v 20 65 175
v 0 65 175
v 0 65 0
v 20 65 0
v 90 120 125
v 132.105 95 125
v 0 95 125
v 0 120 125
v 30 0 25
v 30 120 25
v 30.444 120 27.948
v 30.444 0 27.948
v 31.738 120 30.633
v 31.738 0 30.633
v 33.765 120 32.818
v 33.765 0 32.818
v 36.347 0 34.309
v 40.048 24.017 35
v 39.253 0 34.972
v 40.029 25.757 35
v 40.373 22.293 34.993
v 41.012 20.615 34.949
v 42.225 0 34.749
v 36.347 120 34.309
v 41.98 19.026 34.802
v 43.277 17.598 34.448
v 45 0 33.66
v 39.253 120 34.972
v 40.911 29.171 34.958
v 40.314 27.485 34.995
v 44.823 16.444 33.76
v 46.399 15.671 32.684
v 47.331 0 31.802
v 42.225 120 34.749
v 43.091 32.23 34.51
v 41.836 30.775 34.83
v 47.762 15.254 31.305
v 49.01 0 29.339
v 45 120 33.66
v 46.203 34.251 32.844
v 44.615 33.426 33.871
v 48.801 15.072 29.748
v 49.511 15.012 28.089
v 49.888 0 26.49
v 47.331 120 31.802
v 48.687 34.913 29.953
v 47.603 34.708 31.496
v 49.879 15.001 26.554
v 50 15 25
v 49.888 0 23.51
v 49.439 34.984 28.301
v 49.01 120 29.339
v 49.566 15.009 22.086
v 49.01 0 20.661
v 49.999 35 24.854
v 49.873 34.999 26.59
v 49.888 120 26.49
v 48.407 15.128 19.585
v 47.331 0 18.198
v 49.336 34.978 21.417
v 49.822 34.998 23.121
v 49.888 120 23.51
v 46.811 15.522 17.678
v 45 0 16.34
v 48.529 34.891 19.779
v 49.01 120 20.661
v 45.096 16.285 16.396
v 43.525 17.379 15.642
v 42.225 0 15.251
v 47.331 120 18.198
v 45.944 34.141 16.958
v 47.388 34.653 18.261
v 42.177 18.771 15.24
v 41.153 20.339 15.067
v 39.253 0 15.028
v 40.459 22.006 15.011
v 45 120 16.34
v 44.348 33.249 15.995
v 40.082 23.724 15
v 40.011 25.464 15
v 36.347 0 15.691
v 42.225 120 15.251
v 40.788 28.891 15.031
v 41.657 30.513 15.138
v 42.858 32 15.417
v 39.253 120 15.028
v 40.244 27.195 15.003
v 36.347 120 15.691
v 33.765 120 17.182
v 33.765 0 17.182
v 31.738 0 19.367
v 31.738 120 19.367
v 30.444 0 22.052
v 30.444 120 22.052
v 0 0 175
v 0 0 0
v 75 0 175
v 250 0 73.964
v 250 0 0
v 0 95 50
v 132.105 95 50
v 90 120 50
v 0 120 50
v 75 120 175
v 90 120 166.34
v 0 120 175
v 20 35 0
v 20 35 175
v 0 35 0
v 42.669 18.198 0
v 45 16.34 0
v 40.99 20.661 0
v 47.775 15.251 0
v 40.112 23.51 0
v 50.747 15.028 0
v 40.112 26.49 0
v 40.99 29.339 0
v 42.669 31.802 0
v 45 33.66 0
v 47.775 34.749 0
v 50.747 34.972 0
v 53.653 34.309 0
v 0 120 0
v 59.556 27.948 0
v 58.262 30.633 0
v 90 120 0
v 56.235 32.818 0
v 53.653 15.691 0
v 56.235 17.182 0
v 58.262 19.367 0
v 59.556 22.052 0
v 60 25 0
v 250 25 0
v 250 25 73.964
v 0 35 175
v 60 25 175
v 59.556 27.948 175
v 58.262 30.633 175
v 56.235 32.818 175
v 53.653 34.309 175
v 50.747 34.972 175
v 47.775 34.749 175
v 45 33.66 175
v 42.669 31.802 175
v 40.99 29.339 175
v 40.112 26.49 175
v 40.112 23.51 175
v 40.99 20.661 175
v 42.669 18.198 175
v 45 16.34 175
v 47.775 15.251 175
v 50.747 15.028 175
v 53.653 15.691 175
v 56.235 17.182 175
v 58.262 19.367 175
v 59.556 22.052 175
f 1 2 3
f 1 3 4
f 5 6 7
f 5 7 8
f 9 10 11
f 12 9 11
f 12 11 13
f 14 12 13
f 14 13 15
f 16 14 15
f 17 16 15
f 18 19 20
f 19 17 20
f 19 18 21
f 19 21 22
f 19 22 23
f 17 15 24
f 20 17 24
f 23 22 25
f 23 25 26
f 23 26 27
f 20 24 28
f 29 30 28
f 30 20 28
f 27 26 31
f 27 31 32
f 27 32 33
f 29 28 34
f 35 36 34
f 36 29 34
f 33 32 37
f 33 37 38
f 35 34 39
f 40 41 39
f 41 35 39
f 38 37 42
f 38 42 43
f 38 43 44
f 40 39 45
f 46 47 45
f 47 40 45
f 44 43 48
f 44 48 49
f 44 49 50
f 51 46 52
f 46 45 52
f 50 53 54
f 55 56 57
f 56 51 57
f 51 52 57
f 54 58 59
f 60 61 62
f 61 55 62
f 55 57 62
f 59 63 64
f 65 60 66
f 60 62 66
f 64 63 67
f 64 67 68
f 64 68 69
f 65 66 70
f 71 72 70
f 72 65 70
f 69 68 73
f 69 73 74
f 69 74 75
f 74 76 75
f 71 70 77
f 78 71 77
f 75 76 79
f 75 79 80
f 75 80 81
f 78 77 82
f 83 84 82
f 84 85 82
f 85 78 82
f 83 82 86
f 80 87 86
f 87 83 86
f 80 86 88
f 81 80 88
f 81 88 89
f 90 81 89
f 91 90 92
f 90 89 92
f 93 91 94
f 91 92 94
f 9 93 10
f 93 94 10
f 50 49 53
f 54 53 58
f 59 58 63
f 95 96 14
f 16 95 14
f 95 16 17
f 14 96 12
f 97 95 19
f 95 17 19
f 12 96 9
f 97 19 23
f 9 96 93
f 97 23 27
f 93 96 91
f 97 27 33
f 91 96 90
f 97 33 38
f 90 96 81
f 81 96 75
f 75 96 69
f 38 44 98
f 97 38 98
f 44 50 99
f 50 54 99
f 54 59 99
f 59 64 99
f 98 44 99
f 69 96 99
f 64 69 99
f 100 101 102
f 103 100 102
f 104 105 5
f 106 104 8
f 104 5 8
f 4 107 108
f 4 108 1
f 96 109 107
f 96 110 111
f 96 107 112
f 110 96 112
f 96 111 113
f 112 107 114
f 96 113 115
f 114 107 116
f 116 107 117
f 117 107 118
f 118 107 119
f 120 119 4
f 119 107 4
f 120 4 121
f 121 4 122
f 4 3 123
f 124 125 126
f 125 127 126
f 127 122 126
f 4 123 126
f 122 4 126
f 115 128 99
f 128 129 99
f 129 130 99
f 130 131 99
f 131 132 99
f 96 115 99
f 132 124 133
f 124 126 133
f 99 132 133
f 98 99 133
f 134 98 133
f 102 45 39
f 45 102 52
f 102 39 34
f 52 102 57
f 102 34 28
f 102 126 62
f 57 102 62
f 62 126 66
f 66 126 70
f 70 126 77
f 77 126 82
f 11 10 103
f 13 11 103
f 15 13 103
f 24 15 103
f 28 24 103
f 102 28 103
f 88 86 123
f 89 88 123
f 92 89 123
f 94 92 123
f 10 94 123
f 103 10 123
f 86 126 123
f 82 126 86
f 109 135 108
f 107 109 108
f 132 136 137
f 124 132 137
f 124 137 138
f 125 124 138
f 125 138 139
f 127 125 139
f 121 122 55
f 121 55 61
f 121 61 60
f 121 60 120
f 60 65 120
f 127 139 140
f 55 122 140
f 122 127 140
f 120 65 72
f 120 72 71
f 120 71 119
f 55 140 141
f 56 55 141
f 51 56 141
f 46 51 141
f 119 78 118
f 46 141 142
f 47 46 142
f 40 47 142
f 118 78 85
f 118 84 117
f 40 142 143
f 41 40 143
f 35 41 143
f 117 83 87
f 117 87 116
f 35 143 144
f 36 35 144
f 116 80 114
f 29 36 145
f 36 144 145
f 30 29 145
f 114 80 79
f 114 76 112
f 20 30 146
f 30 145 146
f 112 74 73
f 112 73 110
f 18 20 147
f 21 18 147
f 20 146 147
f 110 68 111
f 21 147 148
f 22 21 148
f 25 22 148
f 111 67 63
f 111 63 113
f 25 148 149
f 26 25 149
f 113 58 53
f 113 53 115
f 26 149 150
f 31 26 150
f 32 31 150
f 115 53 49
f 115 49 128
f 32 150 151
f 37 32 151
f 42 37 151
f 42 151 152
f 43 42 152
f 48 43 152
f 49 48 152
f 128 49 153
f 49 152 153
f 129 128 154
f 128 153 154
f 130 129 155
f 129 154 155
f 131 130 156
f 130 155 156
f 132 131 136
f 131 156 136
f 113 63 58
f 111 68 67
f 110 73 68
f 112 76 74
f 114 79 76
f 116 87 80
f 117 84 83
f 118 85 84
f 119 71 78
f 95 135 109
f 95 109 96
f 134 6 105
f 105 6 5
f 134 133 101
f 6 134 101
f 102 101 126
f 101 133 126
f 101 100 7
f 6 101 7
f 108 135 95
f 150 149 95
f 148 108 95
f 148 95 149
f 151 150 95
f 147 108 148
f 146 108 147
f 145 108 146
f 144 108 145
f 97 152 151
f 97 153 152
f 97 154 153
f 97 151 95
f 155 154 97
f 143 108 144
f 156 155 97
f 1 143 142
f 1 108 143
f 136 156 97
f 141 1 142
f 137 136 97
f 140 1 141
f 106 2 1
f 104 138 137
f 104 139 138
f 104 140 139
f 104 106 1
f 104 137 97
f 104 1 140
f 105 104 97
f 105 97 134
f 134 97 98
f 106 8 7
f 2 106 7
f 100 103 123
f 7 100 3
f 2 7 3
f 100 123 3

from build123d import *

# Parameters (mm, degrees)
EXTRUDE_3_DEPTH     = 175
CUT_EXTRUDE_2_DEPTH = 220
SKETCH_9_W          = 75
SKETCH_9_H          = 25
CUT_EXTRUDE_3_DEPTH = 220
SKETCH_10_W         = 20
SKETCH_10_H         = 30
CUT_EXTRUDE_4_DEPTH = 220
SKETCH_11_R         = 10
CUT_EXTRUDE_5_DEPTH = 220
SKETCH_12_R         = 10
CUT_EXTRUDE_6_DEPTH = 220


with BuildPart() as part:
    # 草图7 → 凸台-拉伸3 (new body)
    with BuildSketch(Plane.XY):
        Polygon((0, 0), (250, 0), (250, 25), (90, 120), (0, 120), align=None)
    extrude(amount=EXTRUDE_3_DEPTH)

    # 草图8 → 切除-拉伸2 (cut)
    with BuildSketch(Plane(origin=(0, 0, 0), x_dir=(1, 0, 0), z_dir=(0, 1, 0))):
        Polygon((75, -175), (250, -73.963702892), (250, -175), align=None)
    extrude(amount=CUT_EXTRUDE_2_DEPTH, mode=Mode.SUBTRACT)

    # 草图9 → 切除-拉伸3 (cut)
    with BuildSketch(Plane.ZY):
        with Locations((87.5, 107.5)):
            Rectangle(SKETCH_9_W, SKETCH_9_H)
    extrude(amount=-CUT_EXTRUDE_3_DEPTH, mode=Mode.SUBTRACT)

    # 草图10 → 切除-拉伸4 (cut)
    with BuildSketch(Plane.XY.offset(175)):
        with Locations((10, 50)):
            Rectangle(SKETCH_10_W, SKETCH_10_H)
    extrude(amount=-CUT_EXTRUDE_4_DEPTH, mode=Mode.SUBTRACT)

    # 草图11 → 切除-拉伸5 (cut)
    with BuildSketch(Plane.XY.offset(175)):
        with Locations((50, 25)):
            Circle(SKETCH_11_R)
    extrude(amount=-CUT_EXTRUDE_5_DEPTH, mode=Mode.SUBTRACT)

    # 草图12 → 切除-拉伸6 (cut)
    with BuildSketch(Plane(origin=(0, 120, 0), x_dir=(1, 0, 0), z_dir=(0, 1, 0))):
        with Locations(Location((40, -25, 0), (0, 0, 180))):
            Circle(SKETCH_12_R)
    extrude(amount=-CUT_EXTRUDE_6_DEPTH, mode=Mode.SUBTRACT)


solid = part.part
